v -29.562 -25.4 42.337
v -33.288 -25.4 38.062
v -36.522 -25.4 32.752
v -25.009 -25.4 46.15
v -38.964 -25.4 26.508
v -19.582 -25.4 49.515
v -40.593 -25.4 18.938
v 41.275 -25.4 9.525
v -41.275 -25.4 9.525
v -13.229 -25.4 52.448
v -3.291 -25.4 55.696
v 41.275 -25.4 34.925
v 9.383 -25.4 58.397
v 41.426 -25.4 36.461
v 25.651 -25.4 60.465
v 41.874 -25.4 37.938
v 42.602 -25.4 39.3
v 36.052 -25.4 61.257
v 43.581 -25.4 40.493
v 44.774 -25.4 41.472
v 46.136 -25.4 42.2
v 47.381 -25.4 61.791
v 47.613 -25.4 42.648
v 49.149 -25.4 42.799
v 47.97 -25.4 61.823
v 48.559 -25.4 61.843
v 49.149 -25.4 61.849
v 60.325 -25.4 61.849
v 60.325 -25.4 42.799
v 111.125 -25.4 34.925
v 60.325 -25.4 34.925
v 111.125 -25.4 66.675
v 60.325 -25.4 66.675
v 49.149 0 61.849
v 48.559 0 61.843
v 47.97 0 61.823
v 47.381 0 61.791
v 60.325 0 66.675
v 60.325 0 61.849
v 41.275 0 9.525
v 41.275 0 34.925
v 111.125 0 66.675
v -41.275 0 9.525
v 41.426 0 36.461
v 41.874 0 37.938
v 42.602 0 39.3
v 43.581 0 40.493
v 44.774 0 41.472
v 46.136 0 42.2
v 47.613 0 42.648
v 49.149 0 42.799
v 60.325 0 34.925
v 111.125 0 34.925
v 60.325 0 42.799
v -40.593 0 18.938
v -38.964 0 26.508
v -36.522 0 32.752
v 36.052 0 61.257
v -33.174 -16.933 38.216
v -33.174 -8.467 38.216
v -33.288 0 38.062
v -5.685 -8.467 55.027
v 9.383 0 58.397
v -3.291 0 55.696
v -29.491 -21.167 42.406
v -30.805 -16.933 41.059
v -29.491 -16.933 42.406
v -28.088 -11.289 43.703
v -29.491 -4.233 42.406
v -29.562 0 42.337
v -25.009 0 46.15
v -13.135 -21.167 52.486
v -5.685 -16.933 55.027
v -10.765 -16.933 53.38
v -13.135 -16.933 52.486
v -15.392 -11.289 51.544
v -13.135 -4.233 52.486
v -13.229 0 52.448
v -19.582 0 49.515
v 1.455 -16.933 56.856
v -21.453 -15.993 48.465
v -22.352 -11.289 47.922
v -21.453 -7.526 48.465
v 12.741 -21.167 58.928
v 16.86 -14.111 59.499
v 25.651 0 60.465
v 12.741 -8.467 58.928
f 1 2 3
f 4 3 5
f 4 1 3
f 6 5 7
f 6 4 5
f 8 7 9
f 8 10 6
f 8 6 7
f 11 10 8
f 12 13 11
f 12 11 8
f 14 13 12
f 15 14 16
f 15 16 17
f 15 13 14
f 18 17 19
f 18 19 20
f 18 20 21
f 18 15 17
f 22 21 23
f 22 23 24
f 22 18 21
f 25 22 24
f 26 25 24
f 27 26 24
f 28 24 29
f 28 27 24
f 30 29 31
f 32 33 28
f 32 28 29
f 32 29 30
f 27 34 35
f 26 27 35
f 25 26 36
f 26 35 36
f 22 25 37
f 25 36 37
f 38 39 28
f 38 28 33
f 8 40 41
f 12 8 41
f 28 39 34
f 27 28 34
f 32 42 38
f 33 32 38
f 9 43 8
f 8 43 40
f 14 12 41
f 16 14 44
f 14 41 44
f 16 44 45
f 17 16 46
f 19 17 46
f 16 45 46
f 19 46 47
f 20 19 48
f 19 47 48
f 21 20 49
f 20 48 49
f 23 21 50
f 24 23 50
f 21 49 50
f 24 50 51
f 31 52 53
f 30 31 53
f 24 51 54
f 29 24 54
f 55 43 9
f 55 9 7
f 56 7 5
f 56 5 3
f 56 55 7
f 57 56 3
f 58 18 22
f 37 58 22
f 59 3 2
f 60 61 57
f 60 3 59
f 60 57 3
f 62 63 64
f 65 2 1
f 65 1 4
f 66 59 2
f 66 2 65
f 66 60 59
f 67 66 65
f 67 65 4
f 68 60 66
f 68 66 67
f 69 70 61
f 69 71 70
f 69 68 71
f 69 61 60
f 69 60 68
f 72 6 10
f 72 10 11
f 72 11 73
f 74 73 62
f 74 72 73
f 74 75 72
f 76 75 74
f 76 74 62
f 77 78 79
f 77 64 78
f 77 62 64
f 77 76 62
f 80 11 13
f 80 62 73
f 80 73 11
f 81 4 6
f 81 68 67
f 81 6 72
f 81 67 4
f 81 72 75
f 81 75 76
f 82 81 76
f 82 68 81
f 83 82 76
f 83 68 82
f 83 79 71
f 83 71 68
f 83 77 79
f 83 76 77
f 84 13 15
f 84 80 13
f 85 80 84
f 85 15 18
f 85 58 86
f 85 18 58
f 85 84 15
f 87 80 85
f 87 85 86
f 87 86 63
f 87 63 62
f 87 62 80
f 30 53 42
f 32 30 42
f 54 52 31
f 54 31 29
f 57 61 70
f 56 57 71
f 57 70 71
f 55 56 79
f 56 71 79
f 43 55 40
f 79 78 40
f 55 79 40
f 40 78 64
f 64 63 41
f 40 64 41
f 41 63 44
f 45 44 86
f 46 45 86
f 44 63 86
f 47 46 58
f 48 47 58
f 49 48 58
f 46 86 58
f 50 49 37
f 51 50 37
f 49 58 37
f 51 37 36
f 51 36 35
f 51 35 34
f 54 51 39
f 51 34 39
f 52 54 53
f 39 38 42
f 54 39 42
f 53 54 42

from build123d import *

# Parameters (mm, degrees)
F0_W     = 25.4
F0_H     = 7.874
F0_H_2   = 4.826
F0_H_3   = 19.05
F1_DEPTH = 25.4


with BuildPart() as f1:
    # F0 (on Front) → F1 (new body)
    with BuildSketch(Plane.XZ):
        with BuildLine():
            ThreePointArc((49.149, 61.849), (48.2646519361, 61.8344723936), (47.3812582222, 61.790905252))
            add(Edge.make_bspline(
                [(47.3812582222, 61.790905252), (47.9669561988, 61.8111847616), (48.5561975061, 61.8305479146), (49.149, 61.849)],
                knots=[103.5782893444, 103.5782893444, 103.5782893444, 103.5782893444, 104.4715308206, 104.4715308206, 104.4715308206, 104.4715308206], degree=3))
        make_face()
        with BuildLine():
            Line((-41.275, 9.525), (22.225, 9.525))
            Line((22.225, 9.525), (22.225, 34.925))
            ThreePointArc((22.225, 34.925), (29.4958010794, 53.3275418947), (47.3812582222, 61.790905252))
            add(Edge.make_bspline(
                [(-41.275, 9.525), (-40.8068549943, 44.7662530835), (-20.5349728413, 59.4393385436), (47.3812582222, 61.790905252)],
                knots=[0, 0, 0, 0, 103.5782893444, 103.5782893444, 103.5782893444, 103.5782893444], degree=3))
        make_face()
        with Locations((73.025, 38.862)):
            Rectangle(F0_W, F0_H)
        with Locations((73.025, 64.262)):
            Rectangle(F0_W, F0_H_2)
        Polygon((85.725, 61.849), (85.725, 42.799), (85.725, 34.925), (111.125, 34.925), (111.125, 66.675), (85.725, 66.675), align=None)
        with BuildLine():
            Line((22.225, 9.525), (41.275, 9.525))
            Line((41.275, 9.525), (41.275, 34.925))
            ThreePointArc((41.275, 34.925), (43.5812412049, 40.4927587951), (49.149, 42.799))
            Line((49.149, 42.799), (60.325, 42.799))
            Line((60.325, 42.799), (60.325, 61.849))
            Line((60.325, 61.849), (49.149, 61.849))
            add(Edge.make_bspline(
                [(47.3812582222, 61.790905252), (47.9669561988, 61.8111847616), (48.5561975061, 61.8305479146), (49.149, 61.849)],
                knots=[103.5782893444, 103.5782893444, 103.5782893444, 103.5782893444, 104.4715308206, 104.4715308206, 104.4715308206, 104.4715308206], degree=3))
            ThreePointArc((47.3812582222, 61.790905252), (29.4958010794, 53.3275418947), (22.225, 34.925))
            Line((22.225, 34.925), (22.225, 9.525))
        make_face()
        with Locations((73.025, 52.324)):
            Rectangle(F0_W, F0_H_3)
    extrude(amount=F1_DEPTH)


solid = f1.part
